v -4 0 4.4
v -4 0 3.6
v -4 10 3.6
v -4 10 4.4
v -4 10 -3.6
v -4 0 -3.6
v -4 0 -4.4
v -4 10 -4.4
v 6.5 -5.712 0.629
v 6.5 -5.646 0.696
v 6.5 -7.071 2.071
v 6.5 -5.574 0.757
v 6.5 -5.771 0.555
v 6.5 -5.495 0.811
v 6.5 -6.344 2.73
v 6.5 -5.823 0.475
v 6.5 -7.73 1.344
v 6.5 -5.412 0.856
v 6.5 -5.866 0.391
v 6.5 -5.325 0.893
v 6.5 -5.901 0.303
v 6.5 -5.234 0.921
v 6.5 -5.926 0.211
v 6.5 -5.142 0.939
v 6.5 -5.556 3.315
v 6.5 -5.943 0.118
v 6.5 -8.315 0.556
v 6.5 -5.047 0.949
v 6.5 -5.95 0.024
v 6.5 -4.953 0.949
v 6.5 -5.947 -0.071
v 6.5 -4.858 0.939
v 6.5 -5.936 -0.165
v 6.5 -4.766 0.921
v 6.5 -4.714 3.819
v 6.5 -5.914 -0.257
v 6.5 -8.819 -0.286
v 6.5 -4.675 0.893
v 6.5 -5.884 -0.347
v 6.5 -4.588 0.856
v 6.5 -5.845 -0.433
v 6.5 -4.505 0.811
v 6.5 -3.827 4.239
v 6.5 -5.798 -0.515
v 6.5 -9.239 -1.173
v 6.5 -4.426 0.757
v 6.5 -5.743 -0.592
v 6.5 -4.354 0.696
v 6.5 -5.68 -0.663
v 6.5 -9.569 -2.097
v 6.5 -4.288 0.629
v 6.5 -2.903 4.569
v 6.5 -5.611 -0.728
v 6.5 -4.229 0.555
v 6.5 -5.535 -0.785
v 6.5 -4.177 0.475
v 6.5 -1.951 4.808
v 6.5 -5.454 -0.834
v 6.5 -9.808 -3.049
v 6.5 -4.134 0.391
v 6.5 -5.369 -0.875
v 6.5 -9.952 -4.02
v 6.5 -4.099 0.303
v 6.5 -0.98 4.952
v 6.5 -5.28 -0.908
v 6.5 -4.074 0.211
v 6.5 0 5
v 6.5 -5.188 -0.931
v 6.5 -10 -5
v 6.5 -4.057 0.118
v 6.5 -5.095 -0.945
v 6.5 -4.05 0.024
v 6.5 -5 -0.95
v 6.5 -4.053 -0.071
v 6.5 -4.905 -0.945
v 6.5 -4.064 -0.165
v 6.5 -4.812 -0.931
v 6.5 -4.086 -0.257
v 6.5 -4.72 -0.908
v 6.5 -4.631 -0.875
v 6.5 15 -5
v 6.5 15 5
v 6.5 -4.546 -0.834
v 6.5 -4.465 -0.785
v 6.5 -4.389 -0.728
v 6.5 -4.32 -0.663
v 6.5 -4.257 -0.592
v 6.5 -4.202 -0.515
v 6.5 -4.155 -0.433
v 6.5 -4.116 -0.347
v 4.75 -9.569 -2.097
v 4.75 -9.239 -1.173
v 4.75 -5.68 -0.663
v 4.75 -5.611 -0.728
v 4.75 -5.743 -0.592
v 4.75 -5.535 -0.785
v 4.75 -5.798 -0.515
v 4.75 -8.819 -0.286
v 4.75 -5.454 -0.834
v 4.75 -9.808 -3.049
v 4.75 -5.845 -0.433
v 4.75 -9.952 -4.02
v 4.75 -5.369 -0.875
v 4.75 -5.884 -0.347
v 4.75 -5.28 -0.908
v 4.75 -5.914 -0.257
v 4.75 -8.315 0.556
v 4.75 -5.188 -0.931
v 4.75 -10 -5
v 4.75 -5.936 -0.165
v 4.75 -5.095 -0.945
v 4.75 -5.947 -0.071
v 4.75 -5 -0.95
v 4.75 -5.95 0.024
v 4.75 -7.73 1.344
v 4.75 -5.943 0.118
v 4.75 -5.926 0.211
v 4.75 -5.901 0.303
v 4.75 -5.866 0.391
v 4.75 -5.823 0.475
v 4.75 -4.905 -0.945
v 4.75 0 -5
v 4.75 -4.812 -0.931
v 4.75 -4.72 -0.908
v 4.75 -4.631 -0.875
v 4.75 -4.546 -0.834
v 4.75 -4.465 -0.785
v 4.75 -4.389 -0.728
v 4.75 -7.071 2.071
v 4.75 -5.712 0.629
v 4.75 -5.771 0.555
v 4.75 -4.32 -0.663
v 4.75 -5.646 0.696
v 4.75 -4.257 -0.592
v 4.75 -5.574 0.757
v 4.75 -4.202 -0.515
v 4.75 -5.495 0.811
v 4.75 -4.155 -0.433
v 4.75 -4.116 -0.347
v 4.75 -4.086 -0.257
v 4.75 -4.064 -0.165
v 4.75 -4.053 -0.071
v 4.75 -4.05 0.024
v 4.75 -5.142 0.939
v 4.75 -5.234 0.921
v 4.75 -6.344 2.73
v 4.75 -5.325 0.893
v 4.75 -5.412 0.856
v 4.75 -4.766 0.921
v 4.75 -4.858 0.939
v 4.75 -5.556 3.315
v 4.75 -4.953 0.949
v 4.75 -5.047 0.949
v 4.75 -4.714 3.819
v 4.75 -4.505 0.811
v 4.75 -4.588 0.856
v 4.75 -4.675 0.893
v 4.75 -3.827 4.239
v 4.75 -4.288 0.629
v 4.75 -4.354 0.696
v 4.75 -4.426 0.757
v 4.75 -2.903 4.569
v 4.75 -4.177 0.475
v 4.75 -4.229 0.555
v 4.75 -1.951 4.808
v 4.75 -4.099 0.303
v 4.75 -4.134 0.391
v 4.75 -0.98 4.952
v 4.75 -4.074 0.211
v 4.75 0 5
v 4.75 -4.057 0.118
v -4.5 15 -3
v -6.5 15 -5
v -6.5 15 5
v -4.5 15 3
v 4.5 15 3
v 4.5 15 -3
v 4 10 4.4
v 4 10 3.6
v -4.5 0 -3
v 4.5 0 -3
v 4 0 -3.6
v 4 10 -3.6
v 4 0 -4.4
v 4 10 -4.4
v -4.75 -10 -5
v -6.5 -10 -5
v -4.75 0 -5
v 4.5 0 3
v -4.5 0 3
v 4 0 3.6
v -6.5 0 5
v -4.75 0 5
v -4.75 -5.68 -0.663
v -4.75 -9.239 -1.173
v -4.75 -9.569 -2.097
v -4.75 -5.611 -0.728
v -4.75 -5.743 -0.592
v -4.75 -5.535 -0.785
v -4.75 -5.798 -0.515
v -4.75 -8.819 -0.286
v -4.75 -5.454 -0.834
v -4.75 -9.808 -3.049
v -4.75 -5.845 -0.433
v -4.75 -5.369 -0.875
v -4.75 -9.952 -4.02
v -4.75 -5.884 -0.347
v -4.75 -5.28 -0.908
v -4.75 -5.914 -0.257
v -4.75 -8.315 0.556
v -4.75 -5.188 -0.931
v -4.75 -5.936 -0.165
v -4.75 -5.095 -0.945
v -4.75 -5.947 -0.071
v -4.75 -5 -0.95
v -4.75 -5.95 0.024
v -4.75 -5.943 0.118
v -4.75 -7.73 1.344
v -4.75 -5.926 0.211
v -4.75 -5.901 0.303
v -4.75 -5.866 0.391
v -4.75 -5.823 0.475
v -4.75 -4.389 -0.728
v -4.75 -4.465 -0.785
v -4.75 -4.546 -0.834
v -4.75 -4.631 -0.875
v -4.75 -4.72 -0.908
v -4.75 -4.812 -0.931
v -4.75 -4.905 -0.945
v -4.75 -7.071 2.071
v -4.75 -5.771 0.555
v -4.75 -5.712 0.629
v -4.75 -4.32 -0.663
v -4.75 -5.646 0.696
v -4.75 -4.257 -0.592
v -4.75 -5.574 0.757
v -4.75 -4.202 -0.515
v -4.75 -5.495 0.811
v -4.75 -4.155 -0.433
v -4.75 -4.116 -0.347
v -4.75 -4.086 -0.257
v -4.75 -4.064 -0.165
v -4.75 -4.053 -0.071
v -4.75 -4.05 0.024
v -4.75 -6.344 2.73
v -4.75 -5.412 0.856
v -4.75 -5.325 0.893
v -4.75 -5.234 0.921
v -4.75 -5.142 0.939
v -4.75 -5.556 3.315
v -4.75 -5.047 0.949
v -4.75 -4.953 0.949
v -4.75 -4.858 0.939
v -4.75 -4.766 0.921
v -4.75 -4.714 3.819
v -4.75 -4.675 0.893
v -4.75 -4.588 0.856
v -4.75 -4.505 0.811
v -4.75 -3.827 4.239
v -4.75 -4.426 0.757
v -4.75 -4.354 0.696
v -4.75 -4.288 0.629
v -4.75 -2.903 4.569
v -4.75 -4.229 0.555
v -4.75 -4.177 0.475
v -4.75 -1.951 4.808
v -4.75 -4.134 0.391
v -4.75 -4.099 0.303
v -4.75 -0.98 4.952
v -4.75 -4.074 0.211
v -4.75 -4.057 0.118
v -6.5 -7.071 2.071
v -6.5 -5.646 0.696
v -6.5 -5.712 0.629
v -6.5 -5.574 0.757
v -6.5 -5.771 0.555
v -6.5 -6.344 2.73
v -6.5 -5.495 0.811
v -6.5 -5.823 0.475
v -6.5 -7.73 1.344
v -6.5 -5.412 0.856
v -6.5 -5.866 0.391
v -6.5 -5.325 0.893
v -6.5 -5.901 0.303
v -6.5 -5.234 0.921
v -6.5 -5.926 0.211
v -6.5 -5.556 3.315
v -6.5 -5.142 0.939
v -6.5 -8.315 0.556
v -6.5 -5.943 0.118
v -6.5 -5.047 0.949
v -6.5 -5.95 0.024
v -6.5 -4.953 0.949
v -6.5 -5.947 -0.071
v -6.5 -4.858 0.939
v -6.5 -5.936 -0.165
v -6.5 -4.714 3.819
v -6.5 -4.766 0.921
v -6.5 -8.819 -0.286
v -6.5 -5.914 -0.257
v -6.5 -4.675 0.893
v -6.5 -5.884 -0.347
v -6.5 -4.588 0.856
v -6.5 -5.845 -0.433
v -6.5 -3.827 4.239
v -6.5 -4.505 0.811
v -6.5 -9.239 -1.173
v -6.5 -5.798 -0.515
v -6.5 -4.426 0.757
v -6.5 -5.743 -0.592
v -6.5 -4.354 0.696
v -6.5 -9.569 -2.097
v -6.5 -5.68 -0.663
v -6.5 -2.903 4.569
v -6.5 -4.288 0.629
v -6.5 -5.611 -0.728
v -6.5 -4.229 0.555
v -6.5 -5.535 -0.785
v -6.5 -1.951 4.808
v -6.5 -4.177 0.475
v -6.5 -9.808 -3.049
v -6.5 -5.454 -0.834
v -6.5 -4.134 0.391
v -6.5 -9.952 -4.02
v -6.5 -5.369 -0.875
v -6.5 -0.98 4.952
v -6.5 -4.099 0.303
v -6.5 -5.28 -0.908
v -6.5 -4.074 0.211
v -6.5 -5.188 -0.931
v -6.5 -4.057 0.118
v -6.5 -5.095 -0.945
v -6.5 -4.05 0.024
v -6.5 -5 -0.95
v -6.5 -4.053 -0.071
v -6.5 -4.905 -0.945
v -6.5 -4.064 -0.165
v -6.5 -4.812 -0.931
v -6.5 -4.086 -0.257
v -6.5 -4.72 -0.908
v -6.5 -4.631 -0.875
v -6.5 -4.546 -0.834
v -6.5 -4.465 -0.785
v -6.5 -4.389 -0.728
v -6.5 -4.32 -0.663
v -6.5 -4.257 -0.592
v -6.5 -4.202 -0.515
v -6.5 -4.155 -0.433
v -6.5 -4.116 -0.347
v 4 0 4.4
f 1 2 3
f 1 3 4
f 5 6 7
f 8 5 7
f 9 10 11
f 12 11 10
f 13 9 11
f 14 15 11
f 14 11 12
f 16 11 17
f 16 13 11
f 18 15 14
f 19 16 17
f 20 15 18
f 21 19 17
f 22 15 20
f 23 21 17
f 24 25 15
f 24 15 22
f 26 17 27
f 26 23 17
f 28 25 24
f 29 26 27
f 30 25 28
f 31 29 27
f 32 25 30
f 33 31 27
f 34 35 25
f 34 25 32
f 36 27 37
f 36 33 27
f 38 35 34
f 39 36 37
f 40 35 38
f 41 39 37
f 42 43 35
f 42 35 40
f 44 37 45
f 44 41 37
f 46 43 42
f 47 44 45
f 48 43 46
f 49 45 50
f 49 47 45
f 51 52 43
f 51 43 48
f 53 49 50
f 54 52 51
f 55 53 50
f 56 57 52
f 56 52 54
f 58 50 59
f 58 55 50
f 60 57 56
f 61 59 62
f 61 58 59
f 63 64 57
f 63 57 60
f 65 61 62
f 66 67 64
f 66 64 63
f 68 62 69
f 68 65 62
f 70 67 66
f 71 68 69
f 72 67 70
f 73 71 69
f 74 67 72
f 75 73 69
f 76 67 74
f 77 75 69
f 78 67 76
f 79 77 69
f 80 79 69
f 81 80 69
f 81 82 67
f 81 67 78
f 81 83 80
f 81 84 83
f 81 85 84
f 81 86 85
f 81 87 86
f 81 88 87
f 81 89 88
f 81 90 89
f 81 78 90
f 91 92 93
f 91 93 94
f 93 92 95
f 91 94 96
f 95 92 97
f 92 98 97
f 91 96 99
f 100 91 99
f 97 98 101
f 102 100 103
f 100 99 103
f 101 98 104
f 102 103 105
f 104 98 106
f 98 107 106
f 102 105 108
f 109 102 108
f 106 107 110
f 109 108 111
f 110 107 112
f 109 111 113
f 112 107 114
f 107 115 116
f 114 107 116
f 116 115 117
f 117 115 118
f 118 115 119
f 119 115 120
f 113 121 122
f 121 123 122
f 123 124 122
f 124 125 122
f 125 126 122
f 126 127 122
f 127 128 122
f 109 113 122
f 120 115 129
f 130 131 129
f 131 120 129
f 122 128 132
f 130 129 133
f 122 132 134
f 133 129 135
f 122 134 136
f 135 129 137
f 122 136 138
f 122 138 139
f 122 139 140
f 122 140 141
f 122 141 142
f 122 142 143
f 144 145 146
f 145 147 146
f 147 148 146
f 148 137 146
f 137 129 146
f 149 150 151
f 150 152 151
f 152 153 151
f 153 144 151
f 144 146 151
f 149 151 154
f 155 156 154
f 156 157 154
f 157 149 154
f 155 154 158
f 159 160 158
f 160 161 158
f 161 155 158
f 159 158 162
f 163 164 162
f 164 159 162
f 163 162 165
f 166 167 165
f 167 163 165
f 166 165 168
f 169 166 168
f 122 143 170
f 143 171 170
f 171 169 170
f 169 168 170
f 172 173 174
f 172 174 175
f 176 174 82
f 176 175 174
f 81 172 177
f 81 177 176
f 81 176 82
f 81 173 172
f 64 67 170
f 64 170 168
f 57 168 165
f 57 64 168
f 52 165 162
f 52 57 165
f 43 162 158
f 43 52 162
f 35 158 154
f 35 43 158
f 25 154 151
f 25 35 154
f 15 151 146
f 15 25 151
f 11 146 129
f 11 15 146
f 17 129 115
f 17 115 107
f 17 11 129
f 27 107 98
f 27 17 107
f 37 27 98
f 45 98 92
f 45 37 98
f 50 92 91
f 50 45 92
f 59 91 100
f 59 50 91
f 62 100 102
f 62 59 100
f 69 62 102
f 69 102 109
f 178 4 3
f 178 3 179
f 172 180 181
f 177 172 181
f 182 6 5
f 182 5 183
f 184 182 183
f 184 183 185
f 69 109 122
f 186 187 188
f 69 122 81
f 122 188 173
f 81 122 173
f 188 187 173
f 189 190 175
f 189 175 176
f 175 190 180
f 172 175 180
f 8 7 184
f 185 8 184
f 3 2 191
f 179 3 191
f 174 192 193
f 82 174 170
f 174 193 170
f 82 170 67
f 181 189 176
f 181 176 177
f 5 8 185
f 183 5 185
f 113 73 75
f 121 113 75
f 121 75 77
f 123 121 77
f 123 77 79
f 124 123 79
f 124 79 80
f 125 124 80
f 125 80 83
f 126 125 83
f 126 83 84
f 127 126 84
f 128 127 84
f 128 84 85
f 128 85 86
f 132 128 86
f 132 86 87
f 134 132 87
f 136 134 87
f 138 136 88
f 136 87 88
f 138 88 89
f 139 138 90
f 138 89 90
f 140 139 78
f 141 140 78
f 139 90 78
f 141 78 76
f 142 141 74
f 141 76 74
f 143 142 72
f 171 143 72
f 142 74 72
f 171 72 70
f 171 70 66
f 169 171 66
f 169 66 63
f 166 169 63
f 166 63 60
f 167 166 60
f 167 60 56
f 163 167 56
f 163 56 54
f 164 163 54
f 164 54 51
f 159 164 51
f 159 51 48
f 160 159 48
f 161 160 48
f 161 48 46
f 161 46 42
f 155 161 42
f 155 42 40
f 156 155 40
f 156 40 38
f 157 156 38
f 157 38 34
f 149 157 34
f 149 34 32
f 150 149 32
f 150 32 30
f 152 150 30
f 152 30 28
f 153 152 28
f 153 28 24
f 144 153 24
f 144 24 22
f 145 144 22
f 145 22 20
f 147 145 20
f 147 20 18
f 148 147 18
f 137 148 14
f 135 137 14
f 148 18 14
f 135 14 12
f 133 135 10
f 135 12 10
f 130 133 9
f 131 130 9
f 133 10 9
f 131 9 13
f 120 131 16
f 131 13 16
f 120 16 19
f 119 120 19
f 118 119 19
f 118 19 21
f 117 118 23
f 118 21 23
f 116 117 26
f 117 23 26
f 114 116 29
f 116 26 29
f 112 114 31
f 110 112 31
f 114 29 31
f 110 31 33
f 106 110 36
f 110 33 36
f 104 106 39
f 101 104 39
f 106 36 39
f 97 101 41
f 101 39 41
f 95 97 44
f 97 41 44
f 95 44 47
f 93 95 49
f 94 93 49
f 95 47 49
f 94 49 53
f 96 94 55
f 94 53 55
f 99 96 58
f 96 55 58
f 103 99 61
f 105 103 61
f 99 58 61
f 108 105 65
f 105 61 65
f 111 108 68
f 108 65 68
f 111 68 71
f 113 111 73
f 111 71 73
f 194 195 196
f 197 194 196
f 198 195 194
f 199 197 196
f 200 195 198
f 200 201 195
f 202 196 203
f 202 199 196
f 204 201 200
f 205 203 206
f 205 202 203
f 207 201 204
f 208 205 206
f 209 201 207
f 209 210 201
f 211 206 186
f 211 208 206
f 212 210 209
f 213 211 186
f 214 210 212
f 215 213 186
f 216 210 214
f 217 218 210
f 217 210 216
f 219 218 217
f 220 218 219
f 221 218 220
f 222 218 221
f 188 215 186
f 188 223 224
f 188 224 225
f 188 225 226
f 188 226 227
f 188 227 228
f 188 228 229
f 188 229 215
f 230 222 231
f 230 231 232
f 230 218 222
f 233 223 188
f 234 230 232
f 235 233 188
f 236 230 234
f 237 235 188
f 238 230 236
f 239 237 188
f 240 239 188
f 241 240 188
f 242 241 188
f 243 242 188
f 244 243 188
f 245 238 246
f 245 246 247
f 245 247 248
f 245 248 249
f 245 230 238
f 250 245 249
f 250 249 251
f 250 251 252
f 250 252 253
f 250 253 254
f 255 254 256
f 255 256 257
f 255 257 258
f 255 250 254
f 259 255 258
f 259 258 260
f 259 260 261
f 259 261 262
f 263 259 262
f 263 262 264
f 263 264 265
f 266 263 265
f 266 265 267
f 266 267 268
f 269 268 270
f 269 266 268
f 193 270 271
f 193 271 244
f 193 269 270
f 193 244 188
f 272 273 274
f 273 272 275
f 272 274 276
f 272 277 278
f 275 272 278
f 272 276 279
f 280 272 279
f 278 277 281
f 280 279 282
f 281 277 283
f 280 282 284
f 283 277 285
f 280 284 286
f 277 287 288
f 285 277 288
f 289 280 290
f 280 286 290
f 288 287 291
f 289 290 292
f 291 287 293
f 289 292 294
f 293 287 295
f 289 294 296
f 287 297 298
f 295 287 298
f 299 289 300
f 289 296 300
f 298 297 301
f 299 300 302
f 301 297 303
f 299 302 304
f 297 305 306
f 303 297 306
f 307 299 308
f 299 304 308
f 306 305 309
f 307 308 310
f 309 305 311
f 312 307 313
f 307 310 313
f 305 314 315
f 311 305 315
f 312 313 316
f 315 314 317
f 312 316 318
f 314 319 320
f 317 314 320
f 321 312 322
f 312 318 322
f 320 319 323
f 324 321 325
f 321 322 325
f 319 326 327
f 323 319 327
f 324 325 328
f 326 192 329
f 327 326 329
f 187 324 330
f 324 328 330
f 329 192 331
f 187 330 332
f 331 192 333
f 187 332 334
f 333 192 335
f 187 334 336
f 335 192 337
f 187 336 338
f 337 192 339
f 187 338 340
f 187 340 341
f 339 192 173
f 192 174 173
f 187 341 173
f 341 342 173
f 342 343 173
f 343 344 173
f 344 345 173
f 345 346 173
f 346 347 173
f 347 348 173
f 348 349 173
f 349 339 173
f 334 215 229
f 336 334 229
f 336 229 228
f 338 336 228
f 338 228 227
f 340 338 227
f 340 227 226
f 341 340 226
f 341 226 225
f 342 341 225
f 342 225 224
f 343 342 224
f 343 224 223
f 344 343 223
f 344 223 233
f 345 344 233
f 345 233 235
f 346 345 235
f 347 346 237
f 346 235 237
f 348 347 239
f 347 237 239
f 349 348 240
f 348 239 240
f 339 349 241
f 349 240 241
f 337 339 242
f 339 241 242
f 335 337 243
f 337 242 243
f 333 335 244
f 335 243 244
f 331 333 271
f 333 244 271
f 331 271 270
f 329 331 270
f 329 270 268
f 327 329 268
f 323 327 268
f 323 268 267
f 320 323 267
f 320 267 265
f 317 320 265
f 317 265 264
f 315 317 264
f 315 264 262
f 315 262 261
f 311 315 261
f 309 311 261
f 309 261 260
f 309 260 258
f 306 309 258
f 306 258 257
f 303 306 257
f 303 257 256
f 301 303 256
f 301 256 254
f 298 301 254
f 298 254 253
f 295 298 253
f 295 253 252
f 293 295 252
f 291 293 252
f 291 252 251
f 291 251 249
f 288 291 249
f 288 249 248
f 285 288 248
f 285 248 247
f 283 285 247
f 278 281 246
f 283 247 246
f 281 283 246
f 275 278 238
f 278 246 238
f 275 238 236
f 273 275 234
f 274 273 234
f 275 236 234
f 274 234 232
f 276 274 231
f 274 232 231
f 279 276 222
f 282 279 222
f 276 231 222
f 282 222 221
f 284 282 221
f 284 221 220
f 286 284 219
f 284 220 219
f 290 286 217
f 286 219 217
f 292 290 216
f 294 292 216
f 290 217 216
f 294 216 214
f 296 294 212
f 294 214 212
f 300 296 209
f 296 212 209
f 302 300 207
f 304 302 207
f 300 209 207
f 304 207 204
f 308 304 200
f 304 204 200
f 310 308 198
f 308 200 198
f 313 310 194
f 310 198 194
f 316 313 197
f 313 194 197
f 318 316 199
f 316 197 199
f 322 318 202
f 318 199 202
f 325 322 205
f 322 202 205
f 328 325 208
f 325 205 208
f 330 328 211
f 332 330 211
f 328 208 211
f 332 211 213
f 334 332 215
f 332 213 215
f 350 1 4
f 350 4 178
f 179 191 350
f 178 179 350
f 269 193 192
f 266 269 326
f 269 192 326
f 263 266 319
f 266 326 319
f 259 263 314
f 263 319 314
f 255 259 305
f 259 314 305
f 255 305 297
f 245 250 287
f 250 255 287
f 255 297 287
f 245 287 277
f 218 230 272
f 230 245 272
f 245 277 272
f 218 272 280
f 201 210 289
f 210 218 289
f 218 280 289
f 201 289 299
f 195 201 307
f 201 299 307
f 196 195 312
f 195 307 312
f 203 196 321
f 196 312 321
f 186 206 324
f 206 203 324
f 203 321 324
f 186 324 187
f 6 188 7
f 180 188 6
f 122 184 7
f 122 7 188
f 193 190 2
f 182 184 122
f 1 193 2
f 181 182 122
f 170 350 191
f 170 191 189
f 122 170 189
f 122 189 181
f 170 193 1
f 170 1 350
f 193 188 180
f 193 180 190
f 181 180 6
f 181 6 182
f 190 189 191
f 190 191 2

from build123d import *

# Parameters (mm, degrees)
SKETCH1_W               = 13
SKETCH1_H               = 10
SKETCH1_W_2             = 9
SKETCH1_H_2             = 6
BOSS_EXTRUDE1_DEPTH     = 15
BOSS_EXTRUDE2_DEPTH     = 2
SKETCH3_R               = 0.95
CUT_EXTRUDE1_DEPTH      = 14
SKETCH5_W               = 0.25
SKETCH5_H               = 10
CUT_EXTRUDE3_DEPTH      = 6
CUT_EXTRUDE3_DEPTH_BACK = 6
SKETCH6_W               = 8
SKETCH6_H               = 0.8
CUT_EXTRUDE4_DEPTH      = 10


with BuildPart() as part:
    # Sketch1 → Boss-Extrude1 (new body)
    with BuildSketch(Plane(origin=(0, 0, 0), x_dir=(1, 0, 0), z_dir=(0, 1, 0))):
        Rectangle(SKETCH1_W, SKETCH1_H)
        Rectangle(SKETCH1_W_2, SKETCH1_H_2, mode=Mode.SUBTRACT)
    extrude(amount=BOSS_EXTRUDE1_DEPTH)

    # Sketch2 → Boss-Extrude2 (add)
    with BuildSketch(Plane(origin=(6.5, 0, 0), x_dir=(0, 0, -1), z_dir=(1, 0, 0))):
        with BuildLine():
            ThreePointArc((-5, 0), (-2.071067812, -7.071067812), (5, -10))
            Line((5, -10), (5, 0))
            Line((5, 0), (-5, 0))
        make_face()
    boss_extrude2 = extrude(amount=-BOSS_EXTRUDE2_DEPTH)

    # Mirror1: Boss-Extrude2 across plane
    add(boss_extrude2.mirror(Plane(origin=(0, 0, 0), x_dir=(0, 0, 1), z_dir=(1, 0, 0))))

    # Sketch3 → Cut-Extrude1 (cut, through all)
    with BuildSketch(Plane(origin=(6.5, 0, 0), x_dir=(0, 0, -1), z_dir=(1, 0, 0))):
        with Locations((0, -5)):
            Circle(SKETCH3_R)
    extrude(amount=-CUT_EXTRUDE1_DEPTH, mode=Mode.SUBTRACT)

    # Sketch5 → Cut-Extrude3 (cut, two sides)
    with BuildSketch(Plane.XY) as cut_extrude3_sk:
        with Locations((-4.625, -5)):
            Rectangle(SKETCH5_W, SKETCH5_H)
        with Locations((4.625, -5)):
            Rectangle(SKETCH5_W, SKETCH5_H)
    extrude(amount=CUT_EXTRUDE3_DEPTH, mode=Mode.SUBTRACT)
    extrude(cut_extrude3_sk.sketch, amount=-CUT_EXTRUDE3_DEPTH_BACK, mode=Mode.SUBTRACT)

    # Sketch6 → Cut-Extrude4 (cut)
    with BuildSketch(Plane.XZ):
        with Locations((0, 4)):
            Rectangle(SKETCH6_W, SKETCH6_H)
    cut_extrude4 = extrude(amount=-CUT_EXTRUDE4_DEPTH, mode=Mode.SUBTRACT)

    # Mirror2: Cut-Extrude4 across plane
    add(cut_extrude4.mirror(Plane.XY), mode=Mode.SUBTRACT)


solid = part.part
